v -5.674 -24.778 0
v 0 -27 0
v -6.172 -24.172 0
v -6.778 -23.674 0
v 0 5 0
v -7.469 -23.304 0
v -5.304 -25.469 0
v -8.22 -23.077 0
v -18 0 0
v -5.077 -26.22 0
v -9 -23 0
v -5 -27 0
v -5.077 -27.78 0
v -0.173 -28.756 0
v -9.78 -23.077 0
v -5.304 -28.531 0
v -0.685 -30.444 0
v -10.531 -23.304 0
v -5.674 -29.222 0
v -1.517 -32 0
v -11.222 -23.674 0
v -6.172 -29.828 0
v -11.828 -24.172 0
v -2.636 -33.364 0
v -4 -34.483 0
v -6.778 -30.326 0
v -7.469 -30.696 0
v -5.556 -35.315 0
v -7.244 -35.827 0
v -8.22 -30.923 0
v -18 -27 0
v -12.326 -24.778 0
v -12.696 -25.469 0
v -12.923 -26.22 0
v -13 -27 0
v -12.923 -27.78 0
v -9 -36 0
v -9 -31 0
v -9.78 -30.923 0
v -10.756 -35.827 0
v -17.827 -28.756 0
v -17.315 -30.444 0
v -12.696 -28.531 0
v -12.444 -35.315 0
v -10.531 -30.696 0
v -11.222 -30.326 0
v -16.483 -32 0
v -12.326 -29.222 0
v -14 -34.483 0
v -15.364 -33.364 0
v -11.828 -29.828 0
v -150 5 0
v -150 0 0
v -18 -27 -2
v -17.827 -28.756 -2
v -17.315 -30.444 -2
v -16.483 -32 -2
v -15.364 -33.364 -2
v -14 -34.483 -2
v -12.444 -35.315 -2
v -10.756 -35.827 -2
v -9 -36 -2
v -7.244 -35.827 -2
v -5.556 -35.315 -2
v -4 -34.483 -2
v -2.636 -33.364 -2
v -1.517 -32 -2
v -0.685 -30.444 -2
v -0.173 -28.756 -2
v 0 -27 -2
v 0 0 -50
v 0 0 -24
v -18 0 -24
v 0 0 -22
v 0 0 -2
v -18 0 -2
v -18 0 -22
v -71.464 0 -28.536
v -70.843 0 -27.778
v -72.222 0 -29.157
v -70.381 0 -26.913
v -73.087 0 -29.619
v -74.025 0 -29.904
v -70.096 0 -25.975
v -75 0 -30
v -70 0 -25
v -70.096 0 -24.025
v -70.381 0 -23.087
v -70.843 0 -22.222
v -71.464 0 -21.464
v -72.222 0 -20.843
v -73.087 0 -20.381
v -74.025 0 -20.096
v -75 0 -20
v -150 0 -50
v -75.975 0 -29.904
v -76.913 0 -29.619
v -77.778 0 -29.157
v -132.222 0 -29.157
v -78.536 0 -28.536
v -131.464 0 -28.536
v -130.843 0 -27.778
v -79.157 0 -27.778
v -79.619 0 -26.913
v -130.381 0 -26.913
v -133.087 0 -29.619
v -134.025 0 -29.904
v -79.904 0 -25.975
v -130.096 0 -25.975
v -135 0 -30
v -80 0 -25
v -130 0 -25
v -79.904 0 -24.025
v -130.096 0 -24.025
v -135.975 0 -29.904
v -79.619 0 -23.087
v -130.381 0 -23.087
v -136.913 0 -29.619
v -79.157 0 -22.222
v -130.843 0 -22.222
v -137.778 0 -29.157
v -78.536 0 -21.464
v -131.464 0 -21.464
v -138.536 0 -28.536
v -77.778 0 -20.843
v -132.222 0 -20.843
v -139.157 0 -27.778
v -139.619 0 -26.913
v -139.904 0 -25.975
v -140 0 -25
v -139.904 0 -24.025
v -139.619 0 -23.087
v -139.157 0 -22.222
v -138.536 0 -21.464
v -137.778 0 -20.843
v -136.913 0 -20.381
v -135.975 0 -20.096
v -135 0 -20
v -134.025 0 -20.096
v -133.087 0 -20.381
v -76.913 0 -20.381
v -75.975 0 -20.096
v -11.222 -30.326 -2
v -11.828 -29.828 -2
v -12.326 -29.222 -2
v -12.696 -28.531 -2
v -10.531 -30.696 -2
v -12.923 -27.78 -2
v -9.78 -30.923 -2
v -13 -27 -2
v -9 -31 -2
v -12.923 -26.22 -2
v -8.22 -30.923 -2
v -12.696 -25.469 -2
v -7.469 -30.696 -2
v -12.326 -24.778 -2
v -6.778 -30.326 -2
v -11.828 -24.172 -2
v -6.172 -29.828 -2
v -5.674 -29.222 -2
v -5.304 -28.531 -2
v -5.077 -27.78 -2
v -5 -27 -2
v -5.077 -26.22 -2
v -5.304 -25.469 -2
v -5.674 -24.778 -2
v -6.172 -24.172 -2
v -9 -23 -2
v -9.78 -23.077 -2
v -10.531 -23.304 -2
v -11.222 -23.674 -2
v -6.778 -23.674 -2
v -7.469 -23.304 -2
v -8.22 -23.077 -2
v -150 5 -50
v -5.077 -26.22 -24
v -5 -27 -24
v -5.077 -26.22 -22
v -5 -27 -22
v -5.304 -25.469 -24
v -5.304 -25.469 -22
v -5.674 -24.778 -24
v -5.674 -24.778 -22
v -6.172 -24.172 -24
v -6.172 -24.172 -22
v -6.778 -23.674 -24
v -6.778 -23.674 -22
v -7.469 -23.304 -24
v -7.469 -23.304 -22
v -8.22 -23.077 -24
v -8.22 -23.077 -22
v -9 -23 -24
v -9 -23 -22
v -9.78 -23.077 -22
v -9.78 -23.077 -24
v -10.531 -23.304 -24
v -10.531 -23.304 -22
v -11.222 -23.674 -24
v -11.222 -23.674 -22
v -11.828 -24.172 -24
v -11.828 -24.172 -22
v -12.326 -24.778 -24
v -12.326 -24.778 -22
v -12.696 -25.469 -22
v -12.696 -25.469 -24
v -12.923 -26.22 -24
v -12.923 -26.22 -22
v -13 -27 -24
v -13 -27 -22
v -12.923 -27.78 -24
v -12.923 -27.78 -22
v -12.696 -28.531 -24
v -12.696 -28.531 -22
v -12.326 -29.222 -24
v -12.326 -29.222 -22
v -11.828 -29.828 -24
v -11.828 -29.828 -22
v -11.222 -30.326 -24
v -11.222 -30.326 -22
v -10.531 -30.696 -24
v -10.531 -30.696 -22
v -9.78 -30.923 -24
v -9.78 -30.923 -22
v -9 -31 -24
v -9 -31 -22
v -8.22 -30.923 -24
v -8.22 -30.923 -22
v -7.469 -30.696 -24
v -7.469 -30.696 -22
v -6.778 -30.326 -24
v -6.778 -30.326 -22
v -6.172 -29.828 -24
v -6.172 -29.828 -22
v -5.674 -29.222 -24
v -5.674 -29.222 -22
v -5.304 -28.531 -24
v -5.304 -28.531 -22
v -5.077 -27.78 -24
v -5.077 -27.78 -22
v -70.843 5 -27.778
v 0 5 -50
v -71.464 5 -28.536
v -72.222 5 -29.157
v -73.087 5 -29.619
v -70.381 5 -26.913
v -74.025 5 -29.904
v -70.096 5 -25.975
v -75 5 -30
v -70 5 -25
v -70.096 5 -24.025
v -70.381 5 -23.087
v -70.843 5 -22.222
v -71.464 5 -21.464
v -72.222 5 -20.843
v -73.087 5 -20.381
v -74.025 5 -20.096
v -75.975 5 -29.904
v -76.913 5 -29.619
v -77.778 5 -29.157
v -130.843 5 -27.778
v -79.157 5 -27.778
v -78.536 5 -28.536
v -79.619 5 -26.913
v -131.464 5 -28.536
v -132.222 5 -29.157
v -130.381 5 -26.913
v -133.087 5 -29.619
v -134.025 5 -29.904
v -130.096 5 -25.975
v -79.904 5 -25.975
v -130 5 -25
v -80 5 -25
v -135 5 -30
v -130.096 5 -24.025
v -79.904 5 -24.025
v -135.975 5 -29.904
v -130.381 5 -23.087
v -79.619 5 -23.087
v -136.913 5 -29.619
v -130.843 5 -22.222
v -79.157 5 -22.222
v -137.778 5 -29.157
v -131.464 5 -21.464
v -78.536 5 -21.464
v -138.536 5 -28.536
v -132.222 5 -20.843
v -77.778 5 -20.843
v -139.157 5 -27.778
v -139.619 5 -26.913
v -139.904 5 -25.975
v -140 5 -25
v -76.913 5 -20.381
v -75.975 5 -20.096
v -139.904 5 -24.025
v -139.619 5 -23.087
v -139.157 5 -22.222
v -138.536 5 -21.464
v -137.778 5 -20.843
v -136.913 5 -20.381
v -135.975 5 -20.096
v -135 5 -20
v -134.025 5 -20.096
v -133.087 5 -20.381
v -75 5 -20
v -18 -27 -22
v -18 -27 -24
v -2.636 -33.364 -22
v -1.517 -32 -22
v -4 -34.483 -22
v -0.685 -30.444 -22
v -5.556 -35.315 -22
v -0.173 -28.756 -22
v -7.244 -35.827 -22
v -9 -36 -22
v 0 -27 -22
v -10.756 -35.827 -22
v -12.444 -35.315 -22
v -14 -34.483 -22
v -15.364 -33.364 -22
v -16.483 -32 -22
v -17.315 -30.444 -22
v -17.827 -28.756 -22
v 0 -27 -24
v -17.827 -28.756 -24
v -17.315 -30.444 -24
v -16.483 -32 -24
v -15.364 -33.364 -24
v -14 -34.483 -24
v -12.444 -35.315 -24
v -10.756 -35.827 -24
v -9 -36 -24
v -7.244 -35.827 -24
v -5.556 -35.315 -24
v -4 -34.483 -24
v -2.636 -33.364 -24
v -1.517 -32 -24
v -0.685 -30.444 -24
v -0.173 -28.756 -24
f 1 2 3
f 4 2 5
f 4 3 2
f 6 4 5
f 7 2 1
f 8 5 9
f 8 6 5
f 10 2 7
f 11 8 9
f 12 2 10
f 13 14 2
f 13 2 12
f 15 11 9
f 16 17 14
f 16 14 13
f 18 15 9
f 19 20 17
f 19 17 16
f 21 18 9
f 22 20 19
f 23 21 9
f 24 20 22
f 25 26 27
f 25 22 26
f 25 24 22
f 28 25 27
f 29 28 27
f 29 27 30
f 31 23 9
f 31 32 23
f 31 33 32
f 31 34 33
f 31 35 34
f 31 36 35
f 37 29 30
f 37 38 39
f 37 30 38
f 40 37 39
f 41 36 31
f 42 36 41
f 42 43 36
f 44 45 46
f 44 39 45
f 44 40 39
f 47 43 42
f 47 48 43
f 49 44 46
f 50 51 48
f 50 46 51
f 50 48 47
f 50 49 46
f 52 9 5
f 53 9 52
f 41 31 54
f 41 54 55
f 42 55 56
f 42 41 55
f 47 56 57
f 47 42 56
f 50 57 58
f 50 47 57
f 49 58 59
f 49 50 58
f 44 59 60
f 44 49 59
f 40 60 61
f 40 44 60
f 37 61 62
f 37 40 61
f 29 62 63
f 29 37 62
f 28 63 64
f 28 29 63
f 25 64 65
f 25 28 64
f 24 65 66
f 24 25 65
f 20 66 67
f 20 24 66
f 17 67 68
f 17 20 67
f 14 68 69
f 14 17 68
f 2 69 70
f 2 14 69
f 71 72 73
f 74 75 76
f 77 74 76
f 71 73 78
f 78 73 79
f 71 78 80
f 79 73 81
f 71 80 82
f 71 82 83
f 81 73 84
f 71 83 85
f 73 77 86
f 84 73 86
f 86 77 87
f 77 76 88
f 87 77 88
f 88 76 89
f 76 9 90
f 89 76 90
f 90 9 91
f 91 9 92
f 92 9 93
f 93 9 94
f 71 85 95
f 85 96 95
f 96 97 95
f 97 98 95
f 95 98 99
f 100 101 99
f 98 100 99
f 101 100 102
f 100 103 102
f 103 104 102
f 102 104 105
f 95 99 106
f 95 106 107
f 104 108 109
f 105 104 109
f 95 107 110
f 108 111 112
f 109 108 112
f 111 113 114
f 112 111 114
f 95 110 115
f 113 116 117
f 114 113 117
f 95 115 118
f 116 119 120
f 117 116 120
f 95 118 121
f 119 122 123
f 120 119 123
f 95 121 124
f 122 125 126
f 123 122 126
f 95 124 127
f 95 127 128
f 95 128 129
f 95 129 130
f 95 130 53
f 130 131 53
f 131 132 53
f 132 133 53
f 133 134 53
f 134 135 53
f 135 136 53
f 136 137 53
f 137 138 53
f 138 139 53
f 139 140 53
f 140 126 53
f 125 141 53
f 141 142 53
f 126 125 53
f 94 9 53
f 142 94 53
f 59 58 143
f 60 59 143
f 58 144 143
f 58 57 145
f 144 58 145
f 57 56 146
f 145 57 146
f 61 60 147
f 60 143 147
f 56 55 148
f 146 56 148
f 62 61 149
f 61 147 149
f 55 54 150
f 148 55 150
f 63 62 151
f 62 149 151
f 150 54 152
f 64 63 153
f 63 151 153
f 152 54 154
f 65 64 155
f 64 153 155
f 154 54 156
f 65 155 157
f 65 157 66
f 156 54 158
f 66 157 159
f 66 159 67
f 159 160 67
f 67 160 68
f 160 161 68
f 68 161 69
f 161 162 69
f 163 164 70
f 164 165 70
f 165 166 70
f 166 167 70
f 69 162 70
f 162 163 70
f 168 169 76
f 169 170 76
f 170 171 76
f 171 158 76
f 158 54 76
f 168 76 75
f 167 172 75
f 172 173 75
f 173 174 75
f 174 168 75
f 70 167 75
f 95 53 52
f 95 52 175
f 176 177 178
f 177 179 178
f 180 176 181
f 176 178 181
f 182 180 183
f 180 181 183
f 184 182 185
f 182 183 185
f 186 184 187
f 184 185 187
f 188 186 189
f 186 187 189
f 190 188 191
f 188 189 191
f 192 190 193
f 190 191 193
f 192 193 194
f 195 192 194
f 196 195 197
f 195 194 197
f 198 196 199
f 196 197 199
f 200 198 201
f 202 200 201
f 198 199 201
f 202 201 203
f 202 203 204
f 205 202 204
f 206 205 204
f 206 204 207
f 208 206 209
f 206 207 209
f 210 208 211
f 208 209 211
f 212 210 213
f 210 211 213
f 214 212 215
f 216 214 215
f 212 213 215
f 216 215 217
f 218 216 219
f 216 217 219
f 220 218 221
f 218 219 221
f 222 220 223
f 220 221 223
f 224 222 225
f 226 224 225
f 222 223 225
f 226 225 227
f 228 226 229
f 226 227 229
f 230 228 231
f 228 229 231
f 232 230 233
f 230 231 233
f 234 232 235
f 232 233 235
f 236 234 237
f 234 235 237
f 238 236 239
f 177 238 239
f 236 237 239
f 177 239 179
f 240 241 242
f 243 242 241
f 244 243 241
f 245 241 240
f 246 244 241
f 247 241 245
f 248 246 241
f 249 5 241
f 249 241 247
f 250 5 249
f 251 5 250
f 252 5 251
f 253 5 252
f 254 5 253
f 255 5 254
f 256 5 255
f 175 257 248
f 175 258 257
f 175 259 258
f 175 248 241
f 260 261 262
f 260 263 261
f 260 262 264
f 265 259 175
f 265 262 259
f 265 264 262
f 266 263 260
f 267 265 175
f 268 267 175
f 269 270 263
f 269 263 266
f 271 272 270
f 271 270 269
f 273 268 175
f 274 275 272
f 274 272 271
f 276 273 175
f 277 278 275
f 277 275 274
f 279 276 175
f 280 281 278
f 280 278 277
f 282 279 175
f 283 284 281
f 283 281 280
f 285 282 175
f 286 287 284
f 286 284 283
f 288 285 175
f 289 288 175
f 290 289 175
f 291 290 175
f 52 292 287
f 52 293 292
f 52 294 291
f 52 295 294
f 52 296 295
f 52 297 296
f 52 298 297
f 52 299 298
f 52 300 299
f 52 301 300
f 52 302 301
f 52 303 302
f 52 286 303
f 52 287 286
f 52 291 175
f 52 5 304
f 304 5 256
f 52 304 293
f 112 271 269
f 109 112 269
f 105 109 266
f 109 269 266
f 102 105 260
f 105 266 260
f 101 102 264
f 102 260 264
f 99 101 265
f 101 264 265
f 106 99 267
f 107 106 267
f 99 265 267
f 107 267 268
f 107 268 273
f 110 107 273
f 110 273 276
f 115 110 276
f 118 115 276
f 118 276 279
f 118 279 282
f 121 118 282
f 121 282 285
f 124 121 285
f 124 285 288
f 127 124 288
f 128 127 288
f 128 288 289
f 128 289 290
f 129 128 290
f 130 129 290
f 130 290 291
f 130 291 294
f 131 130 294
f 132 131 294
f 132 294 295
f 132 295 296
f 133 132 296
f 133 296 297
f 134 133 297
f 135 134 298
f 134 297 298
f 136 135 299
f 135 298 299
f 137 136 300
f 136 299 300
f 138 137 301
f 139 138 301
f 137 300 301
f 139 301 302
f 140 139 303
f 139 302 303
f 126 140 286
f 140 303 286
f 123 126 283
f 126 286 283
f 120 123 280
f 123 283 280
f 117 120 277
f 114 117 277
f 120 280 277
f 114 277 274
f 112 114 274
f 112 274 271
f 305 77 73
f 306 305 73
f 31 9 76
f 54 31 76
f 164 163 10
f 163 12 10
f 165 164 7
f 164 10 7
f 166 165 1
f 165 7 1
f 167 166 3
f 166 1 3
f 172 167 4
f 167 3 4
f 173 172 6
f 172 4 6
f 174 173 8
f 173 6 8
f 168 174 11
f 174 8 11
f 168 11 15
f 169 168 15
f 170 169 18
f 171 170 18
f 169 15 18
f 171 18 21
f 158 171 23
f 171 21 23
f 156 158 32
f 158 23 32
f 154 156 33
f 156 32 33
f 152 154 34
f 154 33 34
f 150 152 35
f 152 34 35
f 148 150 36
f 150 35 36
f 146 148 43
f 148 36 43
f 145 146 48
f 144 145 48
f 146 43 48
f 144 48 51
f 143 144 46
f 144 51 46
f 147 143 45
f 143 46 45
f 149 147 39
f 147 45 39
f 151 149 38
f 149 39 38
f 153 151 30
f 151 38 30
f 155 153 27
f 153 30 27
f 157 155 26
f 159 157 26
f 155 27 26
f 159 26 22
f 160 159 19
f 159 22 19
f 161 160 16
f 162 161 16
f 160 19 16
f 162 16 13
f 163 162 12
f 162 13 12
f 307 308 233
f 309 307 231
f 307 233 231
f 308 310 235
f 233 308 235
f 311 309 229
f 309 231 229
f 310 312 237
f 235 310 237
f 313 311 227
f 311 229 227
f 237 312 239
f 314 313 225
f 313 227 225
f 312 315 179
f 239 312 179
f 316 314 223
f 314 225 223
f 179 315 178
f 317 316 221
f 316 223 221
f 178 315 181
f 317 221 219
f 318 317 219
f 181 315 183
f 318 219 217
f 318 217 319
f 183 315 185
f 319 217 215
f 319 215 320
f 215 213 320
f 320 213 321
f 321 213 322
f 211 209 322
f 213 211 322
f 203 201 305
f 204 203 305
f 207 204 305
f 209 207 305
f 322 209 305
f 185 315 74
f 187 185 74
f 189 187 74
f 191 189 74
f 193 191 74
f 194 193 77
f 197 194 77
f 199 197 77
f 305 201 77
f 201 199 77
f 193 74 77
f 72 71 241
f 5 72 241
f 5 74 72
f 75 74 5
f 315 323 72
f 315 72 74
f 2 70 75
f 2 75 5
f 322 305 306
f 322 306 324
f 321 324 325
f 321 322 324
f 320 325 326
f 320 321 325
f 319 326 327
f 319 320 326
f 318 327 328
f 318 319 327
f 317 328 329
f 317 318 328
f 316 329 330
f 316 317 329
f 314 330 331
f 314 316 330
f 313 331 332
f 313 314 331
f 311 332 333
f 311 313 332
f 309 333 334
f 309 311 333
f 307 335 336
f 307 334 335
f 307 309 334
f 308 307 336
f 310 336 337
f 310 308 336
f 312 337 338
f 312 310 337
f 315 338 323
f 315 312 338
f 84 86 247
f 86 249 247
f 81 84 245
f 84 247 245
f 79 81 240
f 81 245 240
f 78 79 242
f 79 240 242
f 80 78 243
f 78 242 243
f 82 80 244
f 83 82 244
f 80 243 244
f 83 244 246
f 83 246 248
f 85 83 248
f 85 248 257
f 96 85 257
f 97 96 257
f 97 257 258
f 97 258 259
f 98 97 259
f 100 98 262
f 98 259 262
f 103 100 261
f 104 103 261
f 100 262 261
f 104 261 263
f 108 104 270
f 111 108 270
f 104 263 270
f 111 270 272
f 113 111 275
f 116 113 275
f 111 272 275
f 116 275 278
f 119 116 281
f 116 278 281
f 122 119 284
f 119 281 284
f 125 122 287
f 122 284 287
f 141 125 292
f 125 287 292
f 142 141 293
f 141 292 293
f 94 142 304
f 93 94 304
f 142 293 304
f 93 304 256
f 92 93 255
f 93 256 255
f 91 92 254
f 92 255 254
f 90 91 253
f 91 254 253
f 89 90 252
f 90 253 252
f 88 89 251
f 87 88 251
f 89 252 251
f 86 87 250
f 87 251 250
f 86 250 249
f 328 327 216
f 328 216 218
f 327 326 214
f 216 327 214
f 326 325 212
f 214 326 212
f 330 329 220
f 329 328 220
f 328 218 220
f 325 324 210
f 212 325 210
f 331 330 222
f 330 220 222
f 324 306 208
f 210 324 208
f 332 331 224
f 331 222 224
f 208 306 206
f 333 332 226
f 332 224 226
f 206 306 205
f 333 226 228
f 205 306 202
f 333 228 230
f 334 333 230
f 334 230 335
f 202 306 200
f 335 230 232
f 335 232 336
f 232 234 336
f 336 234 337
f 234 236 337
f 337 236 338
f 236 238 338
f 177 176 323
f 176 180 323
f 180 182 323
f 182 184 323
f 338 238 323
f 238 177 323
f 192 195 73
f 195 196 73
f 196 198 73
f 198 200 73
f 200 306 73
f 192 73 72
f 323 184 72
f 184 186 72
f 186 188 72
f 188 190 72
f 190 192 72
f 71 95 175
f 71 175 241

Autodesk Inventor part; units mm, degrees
ref_plane "YZ Plane" through (0, 0, 0) normal (1, 0, 0) x (0, 1, 0)
ref_plane "XZ Plane" through (0, 0, 0) normal (0, 1, 0) x (-1, 0, 0)
ref_plane "XY Plane" through (0, 0, 0) normal (0, 0, 1) x (1, 0, 0)
sketch "Sketch1" plane through (0, 0, 0) normal (0, 1, 0) x (-1, 0, 0)
  line L0 (0, 0) -> (150, 0)
  line L1 (150, 0) -> (150, -50)
  line L2 (150, -50) -> (0, -50)
  line L3 (0, -50) -> (0, 0)
  dimension "d0" = 150
  dimension "d1" = 50
extrude "Extrusion1" add sketch "Sketch1" along normal blind 5
sketch "Sketch2" plane through (0, 5, 0) normal (0, 1, 0) x (1, 0, 0)
  circle A0 centre (-135, 25) radius 5
  line L0 (-150, 0) -> (0, 0) projected
  line L1 (-150, 50) -> (-150, 0) projected
  circle A1 centre (-75, 25) radius 5
  dimension "d4" = 10
  dimension "d5" = 25
  dimension "d6" = 15
  dimension "d7" = 10
  dimension "d8" = 25
  dimension "d9" = 60
extrude "Extrusion2" cut sketch "Sketch2" against normal blind 5
sketch "Sketch4" plane through (0, 0, 0) normal (0, -1, 0) x (1, 0, 0)
  line L0 (0, 0) -> (0, -50) projected
  line L1 (0, 0) -> (-18, 0)
  line L2 (-18, 0) -> (-18, -2)
  line L3 (-18, -2) -> (0, -2)
  line L4 (0, -2) -> (0, 0)
  line L5 (0, -22) -> (-18, -22)
  line L6 (-18, -22) -> (-18, -24)
  line L7 (-18, -24) -> (0, -24)
  line L8 (0, -24) -> (0, -22)
  dimension "d17" = 18
  dimension "d18" = 2
  dimension "d19" = 18
  dimension "d20" = 2
  dimension "d21" = 20
extrude "Extrusion4" add sketch "Sketch4" along normal blind 36
sketch "Sketch5" plane through (-150, 5, 0) normal (0, 0, 1) x (1, 0, 0)
  circle A0 centre (141, -32) radius 9
  line L0 (150, -41) -> (150, 0) projected
  line L1 (150, -41) -> (132, -41) projected
  line L2 (150, -32) -> (150, -41)
  line L3 (132, -41) -> (132, -32)
  line L4 (132, -5) -> (132, -41) projected
  line L5 (132, -41) -> (150, -41)
  circle A1 centre (141, -32) radius 4
  point P0 (150, -5)
  dimension "d24" = 18
  dimension "d25" = 9
  dimension "d26" = 9
  dimension "d27" = 8
extrude "Extrusion5" cut sketch "Sketch5" against normal blind 36 contours L0 L1 A0 | A0 L1 L3 | A1
properties part number "Giá đỡ ròng rọc 2"
